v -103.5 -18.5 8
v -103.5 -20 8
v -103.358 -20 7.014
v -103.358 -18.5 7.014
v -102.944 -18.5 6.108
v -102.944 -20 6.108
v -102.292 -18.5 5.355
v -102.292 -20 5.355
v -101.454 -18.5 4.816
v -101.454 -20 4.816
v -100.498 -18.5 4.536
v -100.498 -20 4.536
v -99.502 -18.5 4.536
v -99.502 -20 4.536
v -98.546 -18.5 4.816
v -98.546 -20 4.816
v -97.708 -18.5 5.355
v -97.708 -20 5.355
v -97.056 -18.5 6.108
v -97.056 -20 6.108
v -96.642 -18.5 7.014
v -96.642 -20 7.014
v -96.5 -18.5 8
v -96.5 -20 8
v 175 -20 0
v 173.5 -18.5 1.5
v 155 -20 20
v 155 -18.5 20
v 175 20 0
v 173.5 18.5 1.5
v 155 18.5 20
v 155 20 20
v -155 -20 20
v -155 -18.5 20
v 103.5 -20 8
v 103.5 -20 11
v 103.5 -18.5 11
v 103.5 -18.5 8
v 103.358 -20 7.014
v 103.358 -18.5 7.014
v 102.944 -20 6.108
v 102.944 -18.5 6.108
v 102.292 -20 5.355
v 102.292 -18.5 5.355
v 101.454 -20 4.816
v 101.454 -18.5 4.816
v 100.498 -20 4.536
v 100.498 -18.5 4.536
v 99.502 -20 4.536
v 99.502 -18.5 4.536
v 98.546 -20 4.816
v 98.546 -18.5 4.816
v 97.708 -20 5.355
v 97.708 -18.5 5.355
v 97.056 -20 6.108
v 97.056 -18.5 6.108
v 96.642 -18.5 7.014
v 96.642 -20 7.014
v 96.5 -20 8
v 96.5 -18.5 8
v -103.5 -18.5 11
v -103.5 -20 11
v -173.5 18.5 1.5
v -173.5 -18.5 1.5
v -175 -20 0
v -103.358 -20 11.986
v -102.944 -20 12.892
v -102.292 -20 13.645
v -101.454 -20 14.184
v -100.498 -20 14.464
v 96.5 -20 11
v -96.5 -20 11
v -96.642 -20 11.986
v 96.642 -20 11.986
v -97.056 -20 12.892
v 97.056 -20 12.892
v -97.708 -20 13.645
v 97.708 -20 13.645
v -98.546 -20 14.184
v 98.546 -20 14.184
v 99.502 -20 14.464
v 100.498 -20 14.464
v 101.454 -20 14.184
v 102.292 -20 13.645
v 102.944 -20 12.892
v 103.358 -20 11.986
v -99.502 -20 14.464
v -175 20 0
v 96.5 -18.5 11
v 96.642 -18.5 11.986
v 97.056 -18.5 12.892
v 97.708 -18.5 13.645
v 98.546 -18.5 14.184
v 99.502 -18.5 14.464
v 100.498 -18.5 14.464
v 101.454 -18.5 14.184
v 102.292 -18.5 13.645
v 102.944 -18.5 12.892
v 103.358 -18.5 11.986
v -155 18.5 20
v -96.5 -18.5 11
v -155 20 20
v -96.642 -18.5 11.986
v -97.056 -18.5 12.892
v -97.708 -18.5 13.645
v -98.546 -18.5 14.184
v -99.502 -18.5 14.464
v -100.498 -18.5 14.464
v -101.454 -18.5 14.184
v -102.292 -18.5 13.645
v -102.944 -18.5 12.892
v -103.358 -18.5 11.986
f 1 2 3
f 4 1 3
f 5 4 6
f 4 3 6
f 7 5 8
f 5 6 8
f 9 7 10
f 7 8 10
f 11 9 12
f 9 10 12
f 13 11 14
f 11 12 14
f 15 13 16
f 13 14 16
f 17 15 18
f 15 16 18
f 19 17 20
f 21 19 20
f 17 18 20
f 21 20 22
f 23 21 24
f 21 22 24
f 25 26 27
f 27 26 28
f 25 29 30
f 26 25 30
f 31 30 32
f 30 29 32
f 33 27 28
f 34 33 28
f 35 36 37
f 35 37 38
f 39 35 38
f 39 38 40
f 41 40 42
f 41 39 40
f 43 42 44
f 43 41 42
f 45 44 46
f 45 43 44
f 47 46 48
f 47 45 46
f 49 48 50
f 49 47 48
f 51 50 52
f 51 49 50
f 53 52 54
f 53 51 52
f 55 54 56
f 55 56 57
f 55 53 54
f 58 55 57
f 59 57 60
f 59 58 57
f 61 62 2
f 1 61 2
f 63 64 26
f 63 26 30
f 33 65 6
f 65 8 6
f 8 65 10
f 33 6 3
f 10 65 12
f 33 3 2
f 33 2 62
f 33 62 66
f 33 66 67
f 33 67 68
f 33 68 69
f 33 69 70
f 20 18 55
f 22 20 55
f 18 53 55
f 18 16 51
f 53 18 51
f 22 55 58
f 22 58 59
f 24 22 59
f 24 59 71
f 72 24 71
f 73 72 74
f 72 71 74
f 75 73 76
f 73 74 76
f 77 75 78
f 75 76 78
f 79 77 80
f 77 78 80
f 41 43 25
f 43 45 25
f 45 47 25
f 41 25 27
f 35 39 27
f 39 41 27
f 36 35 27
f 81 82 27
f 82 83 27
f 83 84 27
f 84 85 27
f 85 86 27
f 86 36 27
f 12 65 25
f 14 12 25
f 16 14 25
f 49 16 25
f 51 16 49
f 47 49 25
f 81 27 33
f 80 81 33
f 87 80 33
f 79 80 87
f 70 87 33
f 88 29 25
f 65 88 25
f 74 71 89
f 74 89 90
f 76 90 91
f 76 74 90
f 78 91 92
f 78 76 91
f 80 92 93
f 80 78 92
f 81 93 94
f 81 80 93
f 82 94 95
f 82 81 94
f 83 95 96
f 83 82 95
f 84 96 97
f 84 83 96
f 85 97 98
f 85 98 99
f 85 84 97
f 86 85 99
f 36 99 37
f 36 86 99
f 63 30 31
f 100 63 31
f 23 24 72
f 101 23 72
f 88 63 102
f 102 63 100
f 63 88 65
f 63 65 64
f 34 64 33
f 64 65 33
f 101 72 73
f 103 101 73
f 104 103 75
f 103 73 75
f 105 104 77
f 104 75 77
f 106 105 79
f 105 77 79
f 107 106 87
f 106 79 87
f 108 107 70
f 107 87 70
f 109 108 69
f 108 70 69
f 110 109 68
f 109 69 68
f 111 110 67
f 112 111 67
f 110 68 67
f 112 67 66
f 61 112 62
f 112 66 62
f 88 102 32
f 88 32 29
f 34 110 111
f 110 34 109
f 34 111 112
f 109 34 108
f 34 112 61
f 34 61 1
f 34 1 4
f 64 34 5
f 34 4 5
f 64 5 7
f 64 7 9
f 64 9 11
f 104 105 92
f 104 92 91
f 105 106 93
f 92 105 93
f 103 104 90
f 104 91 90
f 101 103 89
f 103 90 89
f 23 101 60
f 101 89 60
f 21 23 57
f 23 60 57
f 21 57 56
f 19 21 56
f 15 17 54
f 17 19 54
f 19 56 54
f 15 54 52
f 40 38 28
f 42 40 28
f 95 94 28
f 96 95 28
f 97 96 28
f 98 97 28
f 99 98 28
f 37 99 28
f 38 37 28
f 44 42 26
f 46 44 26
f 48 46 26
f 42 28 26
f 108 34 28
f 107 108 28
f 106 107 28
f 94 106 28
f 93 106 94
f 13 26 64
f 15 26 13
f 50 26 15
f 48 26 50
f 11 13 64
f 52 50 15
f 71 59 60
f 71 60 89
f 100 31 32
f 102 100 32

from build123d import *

# Parameters (mm, degrees)
RESSALTO_EXTRUS_O1_DEPTH = 175
CORTE_EXTRUS_O1_DEPTH    = 50
CORTE_EXTRUS_O2_DEPTH    = 1.5


with BuildPart() as part:
    # Esboço1 → Ressalto-extrusão1 (new, symmetric)
    with BuildSketch(Plane(origin=(0, 0, 0), x_dir=(0, 0, -1), z_dir=(1, 0, 0))):
        Polygon((0, 20), (0, -20), (-20, -20), (-20, -18.5), (-1.5, -18.5), (-1.5, 18.5), (-20, 18.5), (-20, 20), align=None)
    extrude(amount=RESSALTO_EXTRUS_O1_DEPTH, both=True)

    # Esboço2 → Corte-extrusão1 (cut, symmetric)
    with BuildSketch(Plane(origin=(0, 20, 0), x_dir=(1, 0, 0), z_dir=(0, 1, 0))):
        Polygon((-175, 0), (-155, -20), (-175, -20), align=None)
        Polygon((175, 0), (155, -20), (175, -20), align=None)
    extrude(amount=CORTE_EXTRUS_O1_DEPTH, both=True, mode=Mode.SUBTRACT)

    # Esboço3 → Corte-extrusão2 (cut)
    with BuildSketch(Plane.XZ.offset(20)):
        with BuildLine():
            Line((-103.5, 11), (-103.5, 8))
            ThreePointArc((-103.5, 8), (-100, 4.5), (-96.5, 8))
            Line((-96.5, 8), (-96.5, 11))
            ThreePointArc((-96.5, 11), (-100, 14.5), (-103.5, 11))
        make_face()
        with BuildLine():
            Line((96.5, 8), (96.5, 11))
            ThreePointArc((96.5, 11), (100, 14.5), (103.5, 11))
            Line((103.5, 11), (103.5, 8))
            ThreePointArc((103.5, 8), (100, 4.5), (96.5, 8))
        make_face()
    extrude(amount=-CORTE_EXTRUS_O2_DEPTH, mode=Mode.SUBTRACT)


solid = part.part
